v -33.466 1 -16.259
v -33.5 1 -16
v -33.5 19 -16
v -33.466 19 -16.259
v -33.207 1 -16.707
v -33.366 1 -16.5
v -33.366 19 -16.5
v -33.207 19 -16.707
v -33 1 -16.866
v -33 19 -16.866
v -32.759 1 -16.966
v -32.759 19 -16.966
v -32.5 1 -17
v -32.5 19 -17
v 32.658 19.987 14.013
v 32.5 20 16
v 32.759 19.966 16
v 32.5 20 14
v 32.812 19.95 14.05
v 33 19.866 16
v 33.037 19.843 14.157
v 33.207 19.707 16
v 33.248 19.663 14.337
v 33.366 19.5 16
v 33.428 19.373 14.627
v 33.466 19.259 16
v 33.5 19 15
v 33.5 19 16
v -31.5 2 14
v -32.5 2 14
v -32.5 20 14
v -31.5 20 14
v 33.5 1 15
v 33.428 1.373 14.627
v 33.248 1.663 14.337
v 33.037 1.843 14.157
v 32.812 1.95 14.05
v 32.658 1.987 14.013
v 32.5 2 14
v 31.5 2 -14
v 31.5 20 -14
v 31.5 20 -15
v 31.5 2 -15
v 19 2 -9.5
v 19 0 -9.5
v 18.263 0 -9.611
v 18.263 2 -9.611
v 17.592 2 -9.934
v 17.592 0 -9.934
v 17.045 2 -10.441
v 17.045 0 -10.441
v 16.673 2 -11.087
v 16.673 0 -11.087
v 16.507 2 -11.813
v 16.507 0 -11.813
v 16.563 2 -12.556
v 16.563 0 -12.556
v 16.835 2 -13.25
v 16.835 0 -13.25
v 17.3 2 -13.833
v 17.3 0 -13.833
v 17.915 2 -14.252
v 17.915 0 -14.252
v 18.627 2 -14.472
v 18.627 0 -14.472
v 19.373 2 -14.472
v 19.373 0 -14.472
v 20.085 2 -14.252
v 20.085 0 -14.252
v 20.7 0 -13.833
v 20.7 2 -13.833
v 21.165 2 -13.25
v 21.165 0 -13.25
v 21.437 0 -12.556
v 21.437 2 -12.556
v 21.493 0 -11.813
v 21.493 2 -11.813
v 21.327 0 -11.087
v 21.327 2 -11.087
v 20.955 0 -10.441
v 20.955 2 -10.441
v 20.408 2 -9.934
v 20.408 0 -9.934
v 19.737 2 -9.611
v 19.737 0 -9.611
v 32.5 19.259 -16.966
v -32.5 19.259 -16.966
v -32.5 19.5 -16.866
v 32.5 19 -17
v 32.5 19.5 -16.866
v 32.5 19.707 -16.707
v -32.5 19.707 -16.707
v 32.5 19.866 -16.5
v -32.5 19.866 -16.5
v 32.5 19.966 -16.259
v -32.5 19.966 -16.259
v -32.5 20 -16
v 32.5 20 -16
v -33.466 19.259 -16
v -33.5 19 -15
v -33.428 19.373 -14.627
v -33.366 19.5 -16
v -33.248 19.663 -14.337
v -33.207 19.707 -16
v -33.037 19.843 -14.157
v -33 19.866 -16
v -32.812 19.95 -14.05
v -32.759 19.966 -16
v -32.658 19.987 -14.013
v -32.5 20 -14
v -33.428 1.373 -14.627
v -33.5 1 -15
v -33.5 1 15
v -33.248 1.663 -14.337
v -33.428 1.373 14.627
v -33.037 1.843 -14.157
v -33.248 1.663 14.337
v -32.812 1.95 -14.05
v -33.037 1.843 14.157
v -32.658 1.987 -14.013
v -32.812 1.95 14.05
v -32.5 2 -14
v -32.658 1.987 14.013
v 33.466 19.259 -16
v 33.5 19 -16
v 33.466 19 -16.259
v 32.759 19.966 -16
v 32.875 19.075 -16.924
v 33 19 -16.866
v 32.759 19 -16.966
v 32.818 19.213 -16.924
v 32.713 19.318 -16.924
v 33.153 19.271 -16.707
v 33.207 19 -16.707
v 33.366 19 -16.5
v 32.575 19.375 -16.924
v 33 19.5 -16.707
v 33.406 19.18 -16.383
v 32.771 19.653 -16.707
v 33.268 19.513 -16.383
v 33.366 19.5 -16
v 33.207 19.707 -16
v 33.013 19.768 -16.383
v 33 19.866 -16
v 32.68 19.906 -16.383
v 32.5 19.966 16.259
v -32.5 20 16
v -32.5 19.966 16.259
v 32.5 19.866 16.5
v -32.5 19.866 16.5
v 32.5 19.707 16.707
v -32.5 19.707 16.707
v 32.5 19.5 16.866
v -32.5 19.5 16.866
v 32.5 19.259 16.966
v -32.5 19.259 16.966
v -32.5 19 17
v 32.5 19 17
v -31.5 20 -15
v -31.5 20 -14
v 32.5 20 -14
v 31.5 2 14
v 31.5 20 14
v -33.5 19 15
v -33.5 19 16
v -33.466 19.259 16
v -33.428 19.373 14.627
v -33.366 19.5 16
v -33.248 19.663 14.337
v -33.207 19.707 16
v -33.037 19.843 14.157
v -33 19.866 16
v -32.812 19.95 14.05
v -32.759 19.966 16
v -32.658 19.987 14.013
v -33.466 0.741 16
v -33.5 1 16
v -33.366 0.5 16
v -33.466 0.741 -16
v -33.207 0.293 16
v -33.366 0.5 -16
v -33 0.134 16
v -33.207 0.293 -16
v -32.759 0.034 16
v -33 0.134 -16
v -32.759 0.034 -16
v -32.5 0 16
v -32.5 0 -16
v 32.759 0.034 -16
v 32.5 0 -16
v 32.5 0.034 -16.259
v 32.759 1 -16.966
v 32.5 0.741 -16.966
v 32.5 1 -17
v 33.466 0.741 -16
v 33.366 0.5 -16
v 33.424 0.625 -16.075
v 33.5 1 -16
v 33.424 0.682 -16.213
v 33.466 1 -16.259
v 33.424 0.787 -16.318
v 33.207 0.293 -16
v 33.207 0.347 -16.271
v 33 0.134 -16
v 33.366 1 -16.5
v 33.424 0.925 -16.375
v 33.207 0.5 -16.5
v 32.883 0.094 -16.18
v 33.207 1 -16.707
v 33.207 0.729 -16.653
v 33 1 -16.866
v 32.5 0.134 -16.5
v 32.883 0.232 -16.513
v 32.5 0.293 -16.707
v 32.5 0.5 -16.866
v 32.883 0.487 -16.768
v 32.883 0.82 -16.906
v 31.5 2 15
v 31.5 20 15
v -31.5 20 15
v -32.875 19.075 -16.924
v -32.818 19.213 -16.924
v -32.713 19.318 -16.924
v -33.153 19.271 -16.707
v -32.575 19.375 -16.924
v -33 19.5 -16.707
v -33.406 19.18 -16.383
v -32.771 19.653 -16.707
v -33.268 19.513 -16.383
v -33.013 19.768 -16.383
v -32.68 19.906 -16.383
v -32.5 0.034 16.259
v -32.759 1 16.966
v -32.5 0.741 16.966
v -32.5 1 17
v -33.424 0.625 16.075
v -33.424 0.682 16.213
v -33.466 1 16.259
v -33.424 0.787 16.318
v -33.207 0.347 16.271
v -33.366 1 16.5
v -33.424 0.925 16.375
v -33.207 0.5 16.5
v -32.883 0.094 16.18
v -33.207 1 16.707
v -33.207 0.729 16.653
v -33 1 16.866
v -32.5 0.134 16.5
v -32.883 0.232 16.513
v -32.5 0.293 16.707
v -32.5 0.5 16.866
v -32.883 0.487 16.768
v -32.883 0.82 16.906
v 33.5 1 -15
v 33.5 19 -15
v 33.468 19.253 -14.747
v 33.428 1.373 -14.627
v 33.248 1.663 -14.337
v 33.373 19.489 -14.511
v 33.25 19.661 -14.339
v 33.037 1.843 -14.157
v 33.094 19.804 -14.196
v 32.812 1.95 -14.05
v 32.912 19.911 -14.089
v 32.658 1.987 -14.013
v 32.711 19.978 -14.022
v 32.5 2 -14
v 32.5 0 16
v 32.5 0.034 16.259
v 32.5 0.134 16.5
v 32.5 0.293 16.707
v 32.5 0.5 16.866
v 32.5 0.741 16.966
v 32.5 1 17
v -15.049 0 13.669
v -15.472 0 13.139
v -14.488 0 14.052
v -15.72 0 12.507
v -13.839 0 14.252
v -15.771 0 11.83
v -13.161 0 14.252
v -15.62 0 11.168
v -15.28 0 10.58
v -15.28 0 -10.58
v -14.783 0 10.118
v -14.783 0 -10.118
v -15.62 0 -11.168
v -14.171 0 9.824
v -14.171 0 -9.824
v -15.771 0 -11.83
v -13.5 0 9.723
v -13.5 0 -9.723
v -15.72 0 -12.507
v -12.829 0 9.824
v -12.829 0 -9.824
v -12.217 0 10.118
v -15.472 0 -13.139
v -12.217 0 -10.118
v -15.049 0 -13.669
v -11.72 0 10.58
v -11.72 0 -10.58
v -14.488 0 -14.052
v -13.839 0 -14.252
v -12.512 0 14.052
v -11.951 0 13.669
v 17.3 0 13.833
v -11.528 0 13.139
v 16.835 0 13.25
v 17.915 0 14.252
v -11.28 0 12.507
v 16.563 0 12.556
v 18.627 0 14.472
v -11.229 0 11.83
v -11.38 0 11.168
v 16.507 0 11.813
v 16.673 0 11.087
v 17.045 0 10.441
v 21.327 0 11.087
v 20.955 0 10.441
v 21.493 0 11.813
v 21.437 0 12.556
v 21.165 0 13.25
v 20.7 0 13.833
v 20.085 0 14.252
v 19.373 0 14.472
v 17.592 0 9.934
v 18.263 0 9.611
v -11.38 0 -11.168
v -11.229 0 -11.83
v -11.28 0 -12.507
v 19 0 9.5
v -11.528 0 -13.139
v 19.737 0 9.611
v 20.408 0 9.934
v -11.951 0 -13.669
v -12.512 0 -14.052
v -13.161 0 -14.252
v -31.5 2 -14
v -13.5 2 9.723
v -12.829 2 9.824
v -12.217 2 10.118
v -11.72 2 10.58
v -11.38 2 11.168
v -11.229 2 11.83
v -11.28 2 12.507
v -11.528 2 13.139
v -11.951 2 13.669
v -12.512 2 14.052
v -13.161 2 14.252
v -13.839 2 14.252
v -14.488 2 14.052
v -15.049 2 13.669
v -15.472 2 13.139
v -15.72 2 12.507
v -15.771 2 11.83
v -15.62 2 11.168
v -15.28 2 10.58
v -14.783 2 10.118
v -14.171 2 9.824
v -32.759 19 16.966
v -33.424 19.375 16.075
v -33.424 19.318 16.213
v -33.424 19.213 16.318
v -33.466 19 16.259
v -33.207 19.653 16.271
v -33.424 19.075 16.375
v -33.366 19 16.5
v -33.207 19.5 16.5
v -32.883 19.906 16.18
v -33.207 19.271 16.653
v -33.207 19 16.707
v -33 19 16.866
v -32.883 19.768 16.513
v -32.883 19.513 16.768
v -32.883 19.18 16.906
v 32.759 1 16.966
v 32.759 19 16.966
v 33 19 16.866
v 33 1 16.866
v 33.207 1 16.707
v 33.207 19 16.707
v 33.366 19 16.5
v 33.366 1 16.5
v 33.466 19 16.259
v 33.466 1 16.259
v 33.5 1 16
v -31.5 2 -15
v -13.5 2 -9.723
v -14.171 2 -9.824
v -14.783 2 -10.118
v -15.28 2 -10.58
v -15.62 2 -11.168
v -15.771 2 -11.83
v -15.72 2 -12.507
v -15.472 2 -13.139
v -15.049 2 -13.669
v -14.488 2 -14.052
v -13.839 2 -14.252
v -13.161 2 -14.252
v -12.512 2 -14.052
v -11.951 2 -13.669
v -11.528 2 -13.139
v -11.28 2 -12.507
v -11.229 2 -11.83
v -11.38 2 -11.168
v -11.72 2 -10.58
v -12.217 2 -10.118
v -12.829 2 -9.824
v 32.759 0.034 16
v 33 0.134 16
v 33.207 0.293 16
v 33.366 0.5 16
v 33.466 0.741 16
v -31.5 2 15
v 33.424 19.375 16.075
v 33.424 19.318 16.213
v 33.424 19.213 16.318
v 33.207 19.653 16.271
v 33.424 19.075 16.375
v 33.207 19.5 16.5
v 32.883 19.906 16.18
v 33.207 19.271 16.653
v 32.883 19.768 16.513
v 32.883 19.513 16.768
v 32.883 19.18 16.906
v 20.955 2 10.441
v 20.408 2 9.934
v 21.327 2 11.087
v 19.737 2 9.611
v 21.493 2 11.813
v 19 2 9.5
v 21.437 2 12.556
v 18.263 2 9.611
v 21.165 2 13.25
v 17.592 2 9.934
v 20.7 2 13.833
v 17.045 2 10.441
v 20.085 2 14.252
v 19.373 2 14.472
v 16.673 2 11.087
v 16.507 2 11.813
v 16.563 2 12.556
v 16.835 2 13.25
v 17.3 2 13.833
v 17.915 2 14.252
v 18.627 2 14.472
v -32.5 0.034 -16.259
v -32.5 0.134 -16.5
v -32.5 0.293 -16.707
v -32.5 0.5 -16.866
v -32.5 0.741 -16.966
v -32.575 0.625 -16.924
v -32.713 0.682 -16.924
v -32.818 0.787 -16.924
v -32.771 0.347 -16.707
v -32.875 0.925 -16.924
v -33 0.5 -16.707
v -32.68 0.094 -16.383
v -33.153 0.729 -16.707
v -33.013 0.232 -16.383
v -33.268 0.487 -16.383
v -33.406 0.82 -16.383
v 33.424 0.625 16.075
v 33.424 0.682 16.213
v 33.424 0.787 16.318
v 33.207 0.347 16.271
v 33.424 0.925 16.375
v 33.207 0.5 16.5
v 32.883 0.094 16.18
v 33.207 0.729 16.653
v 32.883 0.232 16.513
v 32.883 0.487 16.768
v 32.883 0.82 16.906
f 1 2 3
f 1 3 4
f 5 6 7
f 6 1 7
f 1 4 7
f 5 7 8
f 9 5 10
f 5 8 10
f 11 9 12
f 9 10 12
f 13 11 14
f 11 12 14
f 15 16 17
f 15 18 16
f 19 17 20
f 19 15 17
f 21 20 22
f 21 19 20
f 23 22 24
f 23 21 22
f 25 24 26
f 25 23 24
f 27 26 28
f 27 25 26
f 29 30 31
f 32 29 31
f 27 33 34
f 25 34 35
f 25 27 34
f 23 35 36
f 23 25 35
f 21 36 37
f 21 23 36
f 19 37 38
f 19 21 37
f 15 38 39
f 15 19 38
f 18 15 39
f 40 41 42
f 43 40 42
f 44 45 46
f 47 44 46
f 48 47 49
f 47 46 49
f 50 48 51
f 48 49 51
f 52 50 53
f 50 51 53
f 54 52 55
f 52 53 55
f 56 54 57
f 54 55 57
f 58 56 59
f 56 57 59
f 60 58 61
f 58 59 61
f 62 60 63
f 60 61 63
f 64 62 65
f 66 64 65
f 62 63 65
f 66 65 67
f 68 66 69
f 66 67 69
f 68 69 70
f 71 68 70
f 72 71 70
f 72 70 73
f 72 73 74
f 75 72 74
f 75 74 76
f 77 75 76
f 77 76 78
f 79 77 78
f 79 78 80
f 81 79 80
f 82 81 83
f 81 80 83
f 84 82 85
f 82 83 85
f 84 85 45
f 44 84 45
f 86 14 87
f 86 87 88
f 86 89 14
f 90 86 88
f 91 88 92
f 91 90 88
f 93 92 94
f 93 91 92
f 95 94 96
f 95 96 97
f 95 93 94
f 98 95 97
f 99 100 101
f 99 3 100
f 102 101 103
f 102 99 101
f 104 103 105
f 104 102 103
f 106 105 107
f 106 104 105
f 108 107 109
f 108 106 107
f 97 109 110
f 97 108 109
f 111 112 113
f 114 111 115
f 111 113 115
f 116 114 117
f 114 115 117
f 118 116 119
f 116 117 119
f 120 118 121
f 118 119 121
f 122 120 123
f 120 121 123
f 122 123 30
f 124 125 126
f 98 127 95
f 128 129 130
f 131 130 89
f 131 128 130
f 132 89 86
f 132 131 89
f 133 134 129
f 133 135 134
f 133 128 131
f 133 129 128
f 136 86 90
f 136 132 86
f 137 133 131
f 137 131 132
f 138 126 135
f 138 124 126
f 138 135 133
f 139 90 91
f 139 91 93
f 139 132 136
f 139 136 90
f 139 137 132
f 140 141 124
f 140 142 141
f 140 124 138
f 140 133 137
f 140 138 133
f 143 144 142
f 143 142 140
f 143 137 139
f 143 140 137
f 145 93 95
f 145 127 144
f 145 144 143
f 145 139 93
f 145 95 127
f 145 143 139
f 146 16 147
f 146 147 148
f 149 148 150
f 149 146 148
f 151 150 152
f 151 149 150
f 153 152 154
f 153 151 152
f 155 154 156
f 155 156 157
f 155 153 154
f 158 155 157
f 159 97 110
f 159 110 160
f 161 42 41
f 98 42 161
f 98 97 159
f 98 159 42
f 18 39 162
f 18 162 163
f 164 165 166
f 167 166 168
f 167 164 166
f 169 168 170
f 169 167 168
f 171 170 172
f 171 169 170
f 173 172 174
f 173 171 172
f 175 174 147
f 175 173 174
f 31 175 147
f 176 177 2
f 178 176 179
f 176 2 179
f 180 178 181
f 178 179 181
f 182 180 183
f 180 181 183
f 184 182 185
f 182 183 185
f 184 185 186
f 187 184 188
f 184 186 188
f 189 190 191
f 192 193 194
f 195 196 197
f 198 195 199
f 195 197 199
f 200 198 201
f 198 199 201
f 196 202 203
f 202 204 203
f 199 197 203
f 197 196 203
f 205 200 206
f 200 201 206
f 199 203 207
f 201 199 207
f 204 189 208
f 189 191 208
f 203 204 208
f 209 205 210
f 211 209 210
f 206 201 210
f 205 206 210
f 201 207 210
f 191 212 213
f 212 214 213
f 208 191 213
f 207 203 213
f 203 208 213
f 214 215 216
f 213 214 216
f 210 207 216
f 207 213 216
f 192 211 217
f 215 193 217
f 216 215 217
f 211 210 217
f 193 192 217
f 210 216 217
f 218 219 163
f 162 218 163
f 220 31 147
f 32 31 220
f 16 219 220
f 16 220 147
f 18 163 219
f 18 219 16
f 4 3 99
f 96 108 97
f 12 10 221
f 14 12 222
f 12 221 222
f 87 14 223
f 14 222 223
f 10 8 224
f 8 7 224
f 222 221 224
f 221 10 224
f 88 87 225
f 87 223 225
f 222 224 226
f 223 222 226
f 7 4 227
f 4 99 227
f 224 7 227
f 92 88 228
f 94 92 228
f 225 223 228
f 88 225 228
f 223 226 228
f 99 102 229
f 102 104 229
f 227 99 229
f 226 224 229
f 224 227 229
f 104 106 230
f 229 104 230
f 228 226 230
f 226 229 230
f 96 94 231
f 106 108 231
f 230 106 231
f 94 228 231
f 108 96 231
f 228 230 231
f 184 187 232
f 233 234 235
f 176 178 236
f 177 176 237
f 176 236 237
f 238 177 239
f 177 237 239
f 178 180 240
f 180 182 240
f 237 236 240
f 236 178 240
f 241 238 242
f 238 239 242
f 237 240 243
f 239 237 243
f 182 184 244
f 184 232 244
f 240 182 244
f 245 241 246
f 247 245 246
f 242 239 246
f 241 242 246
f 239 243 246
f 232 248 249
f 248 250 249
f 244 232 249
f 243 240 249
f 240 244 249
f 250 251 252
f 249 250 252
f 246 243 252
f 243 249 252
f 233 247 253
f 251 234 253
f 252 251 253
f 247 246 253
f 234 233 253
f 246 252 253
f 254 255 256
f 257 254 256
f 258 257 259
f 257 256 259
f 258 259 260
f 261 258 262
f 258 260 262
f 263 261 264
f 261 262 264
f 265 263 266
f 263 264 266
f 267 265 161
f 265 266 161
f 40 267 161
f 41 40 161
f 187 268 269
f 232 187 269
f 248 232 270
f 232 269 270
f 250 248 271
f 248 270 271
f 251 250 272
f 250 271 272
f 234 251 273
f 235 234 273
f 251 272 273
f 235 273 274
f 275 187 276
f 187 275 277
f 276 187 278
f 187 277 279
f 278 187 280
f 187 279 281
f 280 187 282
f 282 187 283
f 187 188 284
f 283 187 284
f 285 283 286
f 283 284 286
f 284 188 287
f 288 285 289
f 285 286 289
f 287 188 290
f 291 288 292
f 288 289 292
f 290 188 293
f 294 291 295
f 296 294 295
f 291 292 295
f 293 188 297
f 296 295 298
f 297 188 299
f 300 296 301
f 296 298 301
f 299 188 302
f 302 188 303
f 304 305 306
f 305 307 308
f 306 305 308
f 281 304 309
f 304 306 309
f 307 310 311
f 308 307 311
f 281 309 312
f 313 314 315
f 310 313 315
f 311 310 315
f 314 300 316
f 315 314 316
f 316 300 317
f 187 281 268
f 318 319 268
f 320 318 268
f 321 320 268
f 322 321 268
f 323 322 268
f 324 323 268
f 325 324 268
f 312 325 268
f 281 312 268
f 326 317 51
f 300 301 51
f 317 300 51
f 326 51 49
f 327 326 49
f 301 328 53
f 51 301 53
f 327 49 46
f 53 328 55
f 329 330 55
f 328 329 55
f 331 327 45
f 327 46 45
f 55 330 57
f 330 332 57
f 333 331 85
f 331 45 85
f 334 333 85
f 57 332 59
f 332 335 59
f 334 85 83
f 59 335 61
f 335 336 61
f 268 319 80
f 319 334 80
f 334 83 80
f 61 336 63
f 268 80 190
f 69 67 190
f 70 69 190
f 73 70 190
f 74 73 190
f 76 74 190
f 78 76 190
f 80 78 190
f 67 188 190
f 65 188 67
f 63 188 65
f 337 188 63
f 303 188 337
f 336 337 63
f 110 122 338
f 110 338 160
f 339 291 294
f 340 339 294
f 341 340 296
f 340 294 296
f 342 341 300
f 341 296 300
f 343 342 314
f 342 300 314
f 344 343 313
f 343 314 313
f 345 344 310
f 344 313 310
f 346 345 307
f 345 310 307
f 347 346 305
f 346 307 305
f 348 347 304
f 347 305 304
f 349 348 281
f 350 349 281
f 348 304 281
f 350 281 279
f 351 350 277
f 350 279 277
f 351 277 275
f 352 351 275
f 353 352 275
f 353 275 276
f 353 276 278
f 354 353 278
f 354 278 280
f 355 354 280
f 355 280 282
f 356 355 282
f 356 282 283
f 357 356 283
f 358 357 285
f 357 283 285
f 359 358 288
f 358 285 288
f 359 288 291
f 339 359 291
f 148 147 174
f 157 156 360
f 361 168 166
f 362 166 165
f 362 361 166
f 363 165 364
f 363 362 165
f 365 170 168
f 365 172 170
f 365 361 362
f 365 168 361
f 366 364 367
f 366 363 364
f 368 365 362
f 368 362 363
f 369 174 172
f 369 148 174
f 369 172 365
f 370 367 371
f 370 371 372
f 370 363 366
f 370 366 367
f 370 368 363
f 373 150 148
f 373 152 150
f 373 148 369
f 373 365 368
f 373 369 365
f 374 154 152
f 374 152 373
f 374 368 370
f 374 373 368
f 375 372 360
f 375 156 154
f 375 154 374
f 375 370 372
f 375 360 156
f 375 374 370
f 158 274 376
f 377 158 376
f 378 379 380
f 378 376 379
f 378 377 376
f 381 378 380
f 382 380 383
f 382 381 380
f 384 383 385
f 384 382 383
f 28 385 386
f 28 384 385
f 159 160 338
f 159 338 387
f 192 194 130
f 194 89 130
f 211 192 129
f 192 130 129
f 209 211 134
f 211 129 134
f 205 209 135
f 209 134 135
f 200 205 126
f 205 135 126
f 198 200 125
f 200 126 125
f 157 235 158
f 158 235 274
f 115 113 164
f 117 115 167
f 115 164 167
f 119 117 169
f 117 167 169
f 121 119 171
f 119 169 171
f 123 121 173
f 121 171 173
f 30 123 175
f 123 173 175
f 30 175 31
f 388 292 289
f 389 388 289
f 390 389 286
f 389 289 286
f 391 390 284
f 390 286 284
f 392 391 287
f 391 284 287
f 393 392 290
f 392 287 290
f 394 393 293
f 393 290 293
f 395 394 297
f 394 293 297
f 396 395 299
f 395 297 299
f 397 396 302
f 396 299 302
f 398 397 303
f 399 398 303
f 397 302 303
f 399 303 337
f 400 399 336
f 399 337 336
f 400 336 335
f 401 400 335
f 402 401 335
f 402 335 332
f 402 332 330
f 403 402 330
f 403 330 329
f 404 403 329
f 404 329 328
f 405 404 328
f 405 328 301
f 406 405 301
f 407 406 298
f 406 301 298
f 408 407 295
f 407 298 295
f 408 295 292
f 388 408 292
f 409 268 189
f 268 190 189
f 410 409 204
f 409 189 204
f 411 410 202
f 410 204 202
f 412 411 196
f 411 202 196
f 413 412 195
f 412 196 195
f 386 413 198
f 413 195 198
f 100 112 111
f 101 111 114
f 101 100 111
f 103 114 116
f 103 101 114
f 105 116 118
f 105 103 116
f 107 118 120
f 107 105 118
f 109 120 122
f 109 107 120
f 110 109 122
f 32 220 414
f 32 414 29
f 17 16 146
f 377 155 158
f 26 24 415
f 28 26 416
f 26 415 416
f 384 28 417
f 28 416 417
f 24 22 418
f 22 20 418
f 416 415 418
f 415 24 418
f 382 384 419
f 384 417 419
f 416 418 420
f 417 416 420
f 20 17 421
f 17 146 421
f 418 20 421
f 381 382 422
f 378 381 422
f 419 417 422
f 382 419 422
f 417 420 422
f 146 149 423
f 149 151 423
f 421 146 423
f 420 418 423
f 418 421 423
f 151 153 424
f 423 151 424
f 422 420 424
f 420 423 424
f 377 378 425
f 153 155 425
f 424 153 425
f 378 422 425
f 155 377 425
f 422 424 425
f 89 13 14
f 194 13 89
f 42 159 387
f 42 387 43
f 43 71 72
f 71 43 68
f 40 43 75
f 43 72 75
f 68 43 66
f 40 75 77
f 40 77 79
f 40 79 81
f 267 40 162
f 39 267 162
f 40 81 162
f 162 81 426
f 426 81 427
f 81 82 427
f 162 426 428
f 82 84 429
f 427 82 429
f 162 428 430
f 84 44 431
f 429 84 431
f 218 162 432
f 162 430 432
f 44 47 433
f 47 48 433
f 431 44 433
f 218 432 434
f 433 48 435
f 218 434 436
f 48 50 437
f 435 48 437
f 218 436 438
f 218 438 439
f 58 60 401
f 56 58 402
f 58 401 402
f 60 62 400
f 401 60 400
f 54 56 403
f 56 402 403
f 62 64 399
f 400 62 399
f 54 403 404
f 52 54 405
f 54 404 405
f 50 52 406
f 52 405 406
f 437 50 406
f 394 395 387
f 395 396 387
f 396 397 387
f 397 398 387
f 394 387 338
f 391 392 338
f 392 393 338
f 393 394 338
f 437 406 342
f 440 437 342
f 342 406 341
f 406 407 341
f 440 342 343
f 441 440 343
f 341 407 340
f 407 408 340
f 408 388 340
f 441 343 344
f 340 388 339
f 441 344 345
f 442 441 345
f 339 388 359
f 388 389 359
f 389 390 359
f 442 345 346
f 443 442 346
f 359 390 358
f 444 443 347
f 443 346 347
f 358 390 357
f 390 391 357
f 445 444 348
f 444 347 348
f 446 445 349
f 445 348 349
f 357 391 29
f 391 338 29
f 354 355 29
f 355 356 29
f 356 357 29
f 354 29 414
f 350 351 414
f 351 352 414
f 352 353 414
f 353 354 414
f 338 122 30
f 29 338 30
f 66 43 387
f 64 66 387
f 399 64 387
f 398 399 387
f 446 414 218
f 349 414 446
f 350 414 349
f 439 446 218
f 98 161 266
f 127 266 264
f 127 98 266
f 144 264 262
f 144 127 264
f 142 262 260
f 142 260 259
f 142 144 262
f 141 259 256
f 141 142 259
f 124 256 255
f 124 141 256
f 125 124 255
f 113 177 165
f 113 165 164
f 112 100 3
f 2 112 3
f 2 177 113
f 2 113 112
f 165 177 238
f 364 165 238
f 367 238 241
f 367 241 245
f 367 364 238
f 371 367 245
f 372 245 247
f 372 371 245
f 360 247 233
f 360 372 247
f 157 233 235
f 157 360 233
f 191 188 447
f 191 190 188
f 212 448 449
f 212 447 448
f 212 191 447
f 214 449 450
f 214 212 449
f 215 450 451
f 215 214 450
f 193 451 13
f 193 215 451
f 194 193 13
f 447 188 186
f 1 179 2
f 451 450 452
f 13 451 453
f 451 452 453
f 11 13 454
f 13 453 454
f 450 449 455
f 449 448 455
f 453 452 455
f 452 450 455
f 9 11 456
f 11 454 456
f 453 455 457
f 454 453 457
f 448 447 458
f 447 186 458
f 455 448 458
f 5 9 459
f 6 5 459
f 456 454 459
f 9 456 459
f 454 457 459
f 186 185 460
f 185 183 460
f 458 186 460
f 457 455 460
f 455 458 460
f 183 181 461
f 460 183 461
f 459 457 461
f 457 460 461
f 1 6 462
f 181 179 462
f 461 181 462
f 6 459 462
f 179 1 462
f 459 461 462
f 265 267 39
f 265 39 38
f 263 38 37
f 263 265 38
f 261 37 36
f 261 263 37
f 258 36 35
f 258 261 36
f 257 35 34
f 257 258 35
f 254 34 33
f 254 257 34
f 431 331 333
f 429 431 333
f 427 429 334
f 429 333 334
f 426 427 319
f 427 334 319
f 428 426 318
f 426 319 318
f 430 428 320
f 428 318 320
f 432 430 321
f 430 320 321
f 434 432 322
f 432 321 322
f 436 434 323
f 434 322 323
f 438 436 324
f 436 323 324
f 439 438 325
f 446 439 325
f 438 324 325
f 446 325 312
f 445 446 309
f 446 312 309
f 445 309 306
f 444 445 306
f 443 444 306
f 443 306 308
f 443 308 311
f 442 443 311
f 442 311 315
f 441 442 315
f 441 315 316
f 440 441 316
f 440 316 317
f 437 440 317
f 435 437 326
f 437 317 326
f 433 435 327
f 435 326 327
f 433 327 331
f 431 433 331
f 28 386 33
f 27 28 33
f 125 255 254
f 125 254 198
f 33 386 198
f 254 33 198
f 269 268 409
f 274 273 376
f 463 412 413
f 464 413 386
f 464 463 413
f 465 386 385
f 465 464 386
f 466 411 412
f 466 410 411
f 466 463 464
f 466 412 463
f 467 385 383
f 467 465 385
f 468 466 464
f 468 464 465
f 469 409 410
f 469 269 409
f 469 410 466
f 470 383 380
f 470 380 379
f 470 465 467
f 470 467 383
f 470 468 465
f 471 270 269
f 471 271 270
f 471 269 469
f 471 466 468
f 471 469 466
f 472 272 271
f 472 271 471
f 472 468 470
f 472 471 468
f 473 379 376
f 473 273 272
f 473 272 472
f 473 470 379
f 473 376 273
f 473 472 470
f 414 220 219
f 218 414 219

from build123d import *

# Parameters (mm, degrees)
SKETCH1_W           = 67
SKETCH1_H           = 34
BOSS_EXTRUDE1_DEPTH = 20
SKETCH4_W           = 63
SKETCH4_H           = 30
CUT_EXTRUDE1_DEPTH  = 18
SKETCH5_W           = 28
SKETCH5_H           = 18
CUT_EXTRUDE4_DEPTH  = 2
SKETCH8_W           = 28
SKETCH8_H           = 18
CUT_EXTRUDE5_DEPTH  = 2
SKETCH9_R           = 2.5
SKETCH9_R_2         = 2.277231992
CUT_EXTRUDE6_DEPTH  = 2
FILLET1_R           = 1


with BuildPart() as part:
    # Sketch1 → Boss-Extrude1 (new body)
    with BuildSketch(Plane(origin=(0, 0, 0), x_dir=(1, 0, 0), z_dir=(0, 1, 0))):
        Rectangle(SKETCH1_W, SKETCH1_H)
    extrude(amount=BOSS_EXTRUDE1_DEPTH)

    # Sketch4 → Cut-Extrude1 (cut)
    with BuildSketch(Plane(origin=(0, 20, 0), x_dir=(1, 0, 0), z_dir=(0, 1, 0))):
        Rectangle(SKETCH4_W, SKETCH4_H)
    extrude(amount=-CUT_EXTRUDE1_DEPTH, mode=Mode.SUBTRACT)

    # Sketch5 → Cut-Extrude4 (cut)
    with BuildSketch(Plane(origin=(33.5, 0, 0), x_dir=(0, 0, -1), z_dir=(1, 0, 0))):
        with Locations((0, 11)):
            Rectangle(SKETCH5_W, SKETCH5_H)
    extrude(amount=-CUT_EXTRUDE4_DEPTH, mode=Mode.SUBTRACT)

    # Sketch8 → Cut-Extrude5 (cut)
    with BuildSketch(Plane.ZY.offset(33.5)):
        with Locations((0, 11)):
            Rectangle(SKETCH8_W, SKETCH8_H)
    extrude(amount=-CUT_EXTRUDE5_DEPTH, mode=Mode.SUBTRACT)

    # Sketch9 → Cut-Extrude6 (cut)
    with BuildSketch(Plane.XZ):
        with Locations(Location((19, 12, 0), (0, 0, 270))):
            Circle(SKETCH9_R)
        with Locations(Location((19, -12, 0), (0, 0, 90))):
            Circle(SKETCH9_R)
        with Locations(Location((-13.5, 12, 0), (0, 0, 270))):
            Circle(SKETCH9_R_2)
        with Locations(Location((-13.5, -12, 0), (0, 0, 90))):
            Circle(SKETCH9_R_2)
    extrude(amount=-CUT_EXTRUDE6_DEPTH, mode=Mode.SUBTRACT)

    # Fillet1
    fillet1_edges = [part.edges().sort_by_distance(p)[0] for p in [
        (-33.5, 20, -15.5),
        (0, 20, 17),
        (33.5, 20, -15.5),
        (33.5, 11, -14),
        (33.5, 11, 14),
        (33.5, 2, 0),
        (-33.5, 20, 15.5),
        (-33.5, 11, 14),
        (-33.5, 11, -14),
        (-33.5, 2, 0),
        (33.5, 20, 15.5),
        (0, 0, 17),
        (-33.5, 0, 0),
        (0, 0, -17),
        (33.5, 0, 0),
        (33.5, 10, 17),
        (-33.5, 10, 17),
        (-33.5, 10, -17),
        (33.5, 10, -17),
        (0, 20, -17),
    ]]
    fillet(fillet1_edges, radius=FILLET1_R - 0.0001)  # a hair under: the kernel refuses the full size


solid = part.part
